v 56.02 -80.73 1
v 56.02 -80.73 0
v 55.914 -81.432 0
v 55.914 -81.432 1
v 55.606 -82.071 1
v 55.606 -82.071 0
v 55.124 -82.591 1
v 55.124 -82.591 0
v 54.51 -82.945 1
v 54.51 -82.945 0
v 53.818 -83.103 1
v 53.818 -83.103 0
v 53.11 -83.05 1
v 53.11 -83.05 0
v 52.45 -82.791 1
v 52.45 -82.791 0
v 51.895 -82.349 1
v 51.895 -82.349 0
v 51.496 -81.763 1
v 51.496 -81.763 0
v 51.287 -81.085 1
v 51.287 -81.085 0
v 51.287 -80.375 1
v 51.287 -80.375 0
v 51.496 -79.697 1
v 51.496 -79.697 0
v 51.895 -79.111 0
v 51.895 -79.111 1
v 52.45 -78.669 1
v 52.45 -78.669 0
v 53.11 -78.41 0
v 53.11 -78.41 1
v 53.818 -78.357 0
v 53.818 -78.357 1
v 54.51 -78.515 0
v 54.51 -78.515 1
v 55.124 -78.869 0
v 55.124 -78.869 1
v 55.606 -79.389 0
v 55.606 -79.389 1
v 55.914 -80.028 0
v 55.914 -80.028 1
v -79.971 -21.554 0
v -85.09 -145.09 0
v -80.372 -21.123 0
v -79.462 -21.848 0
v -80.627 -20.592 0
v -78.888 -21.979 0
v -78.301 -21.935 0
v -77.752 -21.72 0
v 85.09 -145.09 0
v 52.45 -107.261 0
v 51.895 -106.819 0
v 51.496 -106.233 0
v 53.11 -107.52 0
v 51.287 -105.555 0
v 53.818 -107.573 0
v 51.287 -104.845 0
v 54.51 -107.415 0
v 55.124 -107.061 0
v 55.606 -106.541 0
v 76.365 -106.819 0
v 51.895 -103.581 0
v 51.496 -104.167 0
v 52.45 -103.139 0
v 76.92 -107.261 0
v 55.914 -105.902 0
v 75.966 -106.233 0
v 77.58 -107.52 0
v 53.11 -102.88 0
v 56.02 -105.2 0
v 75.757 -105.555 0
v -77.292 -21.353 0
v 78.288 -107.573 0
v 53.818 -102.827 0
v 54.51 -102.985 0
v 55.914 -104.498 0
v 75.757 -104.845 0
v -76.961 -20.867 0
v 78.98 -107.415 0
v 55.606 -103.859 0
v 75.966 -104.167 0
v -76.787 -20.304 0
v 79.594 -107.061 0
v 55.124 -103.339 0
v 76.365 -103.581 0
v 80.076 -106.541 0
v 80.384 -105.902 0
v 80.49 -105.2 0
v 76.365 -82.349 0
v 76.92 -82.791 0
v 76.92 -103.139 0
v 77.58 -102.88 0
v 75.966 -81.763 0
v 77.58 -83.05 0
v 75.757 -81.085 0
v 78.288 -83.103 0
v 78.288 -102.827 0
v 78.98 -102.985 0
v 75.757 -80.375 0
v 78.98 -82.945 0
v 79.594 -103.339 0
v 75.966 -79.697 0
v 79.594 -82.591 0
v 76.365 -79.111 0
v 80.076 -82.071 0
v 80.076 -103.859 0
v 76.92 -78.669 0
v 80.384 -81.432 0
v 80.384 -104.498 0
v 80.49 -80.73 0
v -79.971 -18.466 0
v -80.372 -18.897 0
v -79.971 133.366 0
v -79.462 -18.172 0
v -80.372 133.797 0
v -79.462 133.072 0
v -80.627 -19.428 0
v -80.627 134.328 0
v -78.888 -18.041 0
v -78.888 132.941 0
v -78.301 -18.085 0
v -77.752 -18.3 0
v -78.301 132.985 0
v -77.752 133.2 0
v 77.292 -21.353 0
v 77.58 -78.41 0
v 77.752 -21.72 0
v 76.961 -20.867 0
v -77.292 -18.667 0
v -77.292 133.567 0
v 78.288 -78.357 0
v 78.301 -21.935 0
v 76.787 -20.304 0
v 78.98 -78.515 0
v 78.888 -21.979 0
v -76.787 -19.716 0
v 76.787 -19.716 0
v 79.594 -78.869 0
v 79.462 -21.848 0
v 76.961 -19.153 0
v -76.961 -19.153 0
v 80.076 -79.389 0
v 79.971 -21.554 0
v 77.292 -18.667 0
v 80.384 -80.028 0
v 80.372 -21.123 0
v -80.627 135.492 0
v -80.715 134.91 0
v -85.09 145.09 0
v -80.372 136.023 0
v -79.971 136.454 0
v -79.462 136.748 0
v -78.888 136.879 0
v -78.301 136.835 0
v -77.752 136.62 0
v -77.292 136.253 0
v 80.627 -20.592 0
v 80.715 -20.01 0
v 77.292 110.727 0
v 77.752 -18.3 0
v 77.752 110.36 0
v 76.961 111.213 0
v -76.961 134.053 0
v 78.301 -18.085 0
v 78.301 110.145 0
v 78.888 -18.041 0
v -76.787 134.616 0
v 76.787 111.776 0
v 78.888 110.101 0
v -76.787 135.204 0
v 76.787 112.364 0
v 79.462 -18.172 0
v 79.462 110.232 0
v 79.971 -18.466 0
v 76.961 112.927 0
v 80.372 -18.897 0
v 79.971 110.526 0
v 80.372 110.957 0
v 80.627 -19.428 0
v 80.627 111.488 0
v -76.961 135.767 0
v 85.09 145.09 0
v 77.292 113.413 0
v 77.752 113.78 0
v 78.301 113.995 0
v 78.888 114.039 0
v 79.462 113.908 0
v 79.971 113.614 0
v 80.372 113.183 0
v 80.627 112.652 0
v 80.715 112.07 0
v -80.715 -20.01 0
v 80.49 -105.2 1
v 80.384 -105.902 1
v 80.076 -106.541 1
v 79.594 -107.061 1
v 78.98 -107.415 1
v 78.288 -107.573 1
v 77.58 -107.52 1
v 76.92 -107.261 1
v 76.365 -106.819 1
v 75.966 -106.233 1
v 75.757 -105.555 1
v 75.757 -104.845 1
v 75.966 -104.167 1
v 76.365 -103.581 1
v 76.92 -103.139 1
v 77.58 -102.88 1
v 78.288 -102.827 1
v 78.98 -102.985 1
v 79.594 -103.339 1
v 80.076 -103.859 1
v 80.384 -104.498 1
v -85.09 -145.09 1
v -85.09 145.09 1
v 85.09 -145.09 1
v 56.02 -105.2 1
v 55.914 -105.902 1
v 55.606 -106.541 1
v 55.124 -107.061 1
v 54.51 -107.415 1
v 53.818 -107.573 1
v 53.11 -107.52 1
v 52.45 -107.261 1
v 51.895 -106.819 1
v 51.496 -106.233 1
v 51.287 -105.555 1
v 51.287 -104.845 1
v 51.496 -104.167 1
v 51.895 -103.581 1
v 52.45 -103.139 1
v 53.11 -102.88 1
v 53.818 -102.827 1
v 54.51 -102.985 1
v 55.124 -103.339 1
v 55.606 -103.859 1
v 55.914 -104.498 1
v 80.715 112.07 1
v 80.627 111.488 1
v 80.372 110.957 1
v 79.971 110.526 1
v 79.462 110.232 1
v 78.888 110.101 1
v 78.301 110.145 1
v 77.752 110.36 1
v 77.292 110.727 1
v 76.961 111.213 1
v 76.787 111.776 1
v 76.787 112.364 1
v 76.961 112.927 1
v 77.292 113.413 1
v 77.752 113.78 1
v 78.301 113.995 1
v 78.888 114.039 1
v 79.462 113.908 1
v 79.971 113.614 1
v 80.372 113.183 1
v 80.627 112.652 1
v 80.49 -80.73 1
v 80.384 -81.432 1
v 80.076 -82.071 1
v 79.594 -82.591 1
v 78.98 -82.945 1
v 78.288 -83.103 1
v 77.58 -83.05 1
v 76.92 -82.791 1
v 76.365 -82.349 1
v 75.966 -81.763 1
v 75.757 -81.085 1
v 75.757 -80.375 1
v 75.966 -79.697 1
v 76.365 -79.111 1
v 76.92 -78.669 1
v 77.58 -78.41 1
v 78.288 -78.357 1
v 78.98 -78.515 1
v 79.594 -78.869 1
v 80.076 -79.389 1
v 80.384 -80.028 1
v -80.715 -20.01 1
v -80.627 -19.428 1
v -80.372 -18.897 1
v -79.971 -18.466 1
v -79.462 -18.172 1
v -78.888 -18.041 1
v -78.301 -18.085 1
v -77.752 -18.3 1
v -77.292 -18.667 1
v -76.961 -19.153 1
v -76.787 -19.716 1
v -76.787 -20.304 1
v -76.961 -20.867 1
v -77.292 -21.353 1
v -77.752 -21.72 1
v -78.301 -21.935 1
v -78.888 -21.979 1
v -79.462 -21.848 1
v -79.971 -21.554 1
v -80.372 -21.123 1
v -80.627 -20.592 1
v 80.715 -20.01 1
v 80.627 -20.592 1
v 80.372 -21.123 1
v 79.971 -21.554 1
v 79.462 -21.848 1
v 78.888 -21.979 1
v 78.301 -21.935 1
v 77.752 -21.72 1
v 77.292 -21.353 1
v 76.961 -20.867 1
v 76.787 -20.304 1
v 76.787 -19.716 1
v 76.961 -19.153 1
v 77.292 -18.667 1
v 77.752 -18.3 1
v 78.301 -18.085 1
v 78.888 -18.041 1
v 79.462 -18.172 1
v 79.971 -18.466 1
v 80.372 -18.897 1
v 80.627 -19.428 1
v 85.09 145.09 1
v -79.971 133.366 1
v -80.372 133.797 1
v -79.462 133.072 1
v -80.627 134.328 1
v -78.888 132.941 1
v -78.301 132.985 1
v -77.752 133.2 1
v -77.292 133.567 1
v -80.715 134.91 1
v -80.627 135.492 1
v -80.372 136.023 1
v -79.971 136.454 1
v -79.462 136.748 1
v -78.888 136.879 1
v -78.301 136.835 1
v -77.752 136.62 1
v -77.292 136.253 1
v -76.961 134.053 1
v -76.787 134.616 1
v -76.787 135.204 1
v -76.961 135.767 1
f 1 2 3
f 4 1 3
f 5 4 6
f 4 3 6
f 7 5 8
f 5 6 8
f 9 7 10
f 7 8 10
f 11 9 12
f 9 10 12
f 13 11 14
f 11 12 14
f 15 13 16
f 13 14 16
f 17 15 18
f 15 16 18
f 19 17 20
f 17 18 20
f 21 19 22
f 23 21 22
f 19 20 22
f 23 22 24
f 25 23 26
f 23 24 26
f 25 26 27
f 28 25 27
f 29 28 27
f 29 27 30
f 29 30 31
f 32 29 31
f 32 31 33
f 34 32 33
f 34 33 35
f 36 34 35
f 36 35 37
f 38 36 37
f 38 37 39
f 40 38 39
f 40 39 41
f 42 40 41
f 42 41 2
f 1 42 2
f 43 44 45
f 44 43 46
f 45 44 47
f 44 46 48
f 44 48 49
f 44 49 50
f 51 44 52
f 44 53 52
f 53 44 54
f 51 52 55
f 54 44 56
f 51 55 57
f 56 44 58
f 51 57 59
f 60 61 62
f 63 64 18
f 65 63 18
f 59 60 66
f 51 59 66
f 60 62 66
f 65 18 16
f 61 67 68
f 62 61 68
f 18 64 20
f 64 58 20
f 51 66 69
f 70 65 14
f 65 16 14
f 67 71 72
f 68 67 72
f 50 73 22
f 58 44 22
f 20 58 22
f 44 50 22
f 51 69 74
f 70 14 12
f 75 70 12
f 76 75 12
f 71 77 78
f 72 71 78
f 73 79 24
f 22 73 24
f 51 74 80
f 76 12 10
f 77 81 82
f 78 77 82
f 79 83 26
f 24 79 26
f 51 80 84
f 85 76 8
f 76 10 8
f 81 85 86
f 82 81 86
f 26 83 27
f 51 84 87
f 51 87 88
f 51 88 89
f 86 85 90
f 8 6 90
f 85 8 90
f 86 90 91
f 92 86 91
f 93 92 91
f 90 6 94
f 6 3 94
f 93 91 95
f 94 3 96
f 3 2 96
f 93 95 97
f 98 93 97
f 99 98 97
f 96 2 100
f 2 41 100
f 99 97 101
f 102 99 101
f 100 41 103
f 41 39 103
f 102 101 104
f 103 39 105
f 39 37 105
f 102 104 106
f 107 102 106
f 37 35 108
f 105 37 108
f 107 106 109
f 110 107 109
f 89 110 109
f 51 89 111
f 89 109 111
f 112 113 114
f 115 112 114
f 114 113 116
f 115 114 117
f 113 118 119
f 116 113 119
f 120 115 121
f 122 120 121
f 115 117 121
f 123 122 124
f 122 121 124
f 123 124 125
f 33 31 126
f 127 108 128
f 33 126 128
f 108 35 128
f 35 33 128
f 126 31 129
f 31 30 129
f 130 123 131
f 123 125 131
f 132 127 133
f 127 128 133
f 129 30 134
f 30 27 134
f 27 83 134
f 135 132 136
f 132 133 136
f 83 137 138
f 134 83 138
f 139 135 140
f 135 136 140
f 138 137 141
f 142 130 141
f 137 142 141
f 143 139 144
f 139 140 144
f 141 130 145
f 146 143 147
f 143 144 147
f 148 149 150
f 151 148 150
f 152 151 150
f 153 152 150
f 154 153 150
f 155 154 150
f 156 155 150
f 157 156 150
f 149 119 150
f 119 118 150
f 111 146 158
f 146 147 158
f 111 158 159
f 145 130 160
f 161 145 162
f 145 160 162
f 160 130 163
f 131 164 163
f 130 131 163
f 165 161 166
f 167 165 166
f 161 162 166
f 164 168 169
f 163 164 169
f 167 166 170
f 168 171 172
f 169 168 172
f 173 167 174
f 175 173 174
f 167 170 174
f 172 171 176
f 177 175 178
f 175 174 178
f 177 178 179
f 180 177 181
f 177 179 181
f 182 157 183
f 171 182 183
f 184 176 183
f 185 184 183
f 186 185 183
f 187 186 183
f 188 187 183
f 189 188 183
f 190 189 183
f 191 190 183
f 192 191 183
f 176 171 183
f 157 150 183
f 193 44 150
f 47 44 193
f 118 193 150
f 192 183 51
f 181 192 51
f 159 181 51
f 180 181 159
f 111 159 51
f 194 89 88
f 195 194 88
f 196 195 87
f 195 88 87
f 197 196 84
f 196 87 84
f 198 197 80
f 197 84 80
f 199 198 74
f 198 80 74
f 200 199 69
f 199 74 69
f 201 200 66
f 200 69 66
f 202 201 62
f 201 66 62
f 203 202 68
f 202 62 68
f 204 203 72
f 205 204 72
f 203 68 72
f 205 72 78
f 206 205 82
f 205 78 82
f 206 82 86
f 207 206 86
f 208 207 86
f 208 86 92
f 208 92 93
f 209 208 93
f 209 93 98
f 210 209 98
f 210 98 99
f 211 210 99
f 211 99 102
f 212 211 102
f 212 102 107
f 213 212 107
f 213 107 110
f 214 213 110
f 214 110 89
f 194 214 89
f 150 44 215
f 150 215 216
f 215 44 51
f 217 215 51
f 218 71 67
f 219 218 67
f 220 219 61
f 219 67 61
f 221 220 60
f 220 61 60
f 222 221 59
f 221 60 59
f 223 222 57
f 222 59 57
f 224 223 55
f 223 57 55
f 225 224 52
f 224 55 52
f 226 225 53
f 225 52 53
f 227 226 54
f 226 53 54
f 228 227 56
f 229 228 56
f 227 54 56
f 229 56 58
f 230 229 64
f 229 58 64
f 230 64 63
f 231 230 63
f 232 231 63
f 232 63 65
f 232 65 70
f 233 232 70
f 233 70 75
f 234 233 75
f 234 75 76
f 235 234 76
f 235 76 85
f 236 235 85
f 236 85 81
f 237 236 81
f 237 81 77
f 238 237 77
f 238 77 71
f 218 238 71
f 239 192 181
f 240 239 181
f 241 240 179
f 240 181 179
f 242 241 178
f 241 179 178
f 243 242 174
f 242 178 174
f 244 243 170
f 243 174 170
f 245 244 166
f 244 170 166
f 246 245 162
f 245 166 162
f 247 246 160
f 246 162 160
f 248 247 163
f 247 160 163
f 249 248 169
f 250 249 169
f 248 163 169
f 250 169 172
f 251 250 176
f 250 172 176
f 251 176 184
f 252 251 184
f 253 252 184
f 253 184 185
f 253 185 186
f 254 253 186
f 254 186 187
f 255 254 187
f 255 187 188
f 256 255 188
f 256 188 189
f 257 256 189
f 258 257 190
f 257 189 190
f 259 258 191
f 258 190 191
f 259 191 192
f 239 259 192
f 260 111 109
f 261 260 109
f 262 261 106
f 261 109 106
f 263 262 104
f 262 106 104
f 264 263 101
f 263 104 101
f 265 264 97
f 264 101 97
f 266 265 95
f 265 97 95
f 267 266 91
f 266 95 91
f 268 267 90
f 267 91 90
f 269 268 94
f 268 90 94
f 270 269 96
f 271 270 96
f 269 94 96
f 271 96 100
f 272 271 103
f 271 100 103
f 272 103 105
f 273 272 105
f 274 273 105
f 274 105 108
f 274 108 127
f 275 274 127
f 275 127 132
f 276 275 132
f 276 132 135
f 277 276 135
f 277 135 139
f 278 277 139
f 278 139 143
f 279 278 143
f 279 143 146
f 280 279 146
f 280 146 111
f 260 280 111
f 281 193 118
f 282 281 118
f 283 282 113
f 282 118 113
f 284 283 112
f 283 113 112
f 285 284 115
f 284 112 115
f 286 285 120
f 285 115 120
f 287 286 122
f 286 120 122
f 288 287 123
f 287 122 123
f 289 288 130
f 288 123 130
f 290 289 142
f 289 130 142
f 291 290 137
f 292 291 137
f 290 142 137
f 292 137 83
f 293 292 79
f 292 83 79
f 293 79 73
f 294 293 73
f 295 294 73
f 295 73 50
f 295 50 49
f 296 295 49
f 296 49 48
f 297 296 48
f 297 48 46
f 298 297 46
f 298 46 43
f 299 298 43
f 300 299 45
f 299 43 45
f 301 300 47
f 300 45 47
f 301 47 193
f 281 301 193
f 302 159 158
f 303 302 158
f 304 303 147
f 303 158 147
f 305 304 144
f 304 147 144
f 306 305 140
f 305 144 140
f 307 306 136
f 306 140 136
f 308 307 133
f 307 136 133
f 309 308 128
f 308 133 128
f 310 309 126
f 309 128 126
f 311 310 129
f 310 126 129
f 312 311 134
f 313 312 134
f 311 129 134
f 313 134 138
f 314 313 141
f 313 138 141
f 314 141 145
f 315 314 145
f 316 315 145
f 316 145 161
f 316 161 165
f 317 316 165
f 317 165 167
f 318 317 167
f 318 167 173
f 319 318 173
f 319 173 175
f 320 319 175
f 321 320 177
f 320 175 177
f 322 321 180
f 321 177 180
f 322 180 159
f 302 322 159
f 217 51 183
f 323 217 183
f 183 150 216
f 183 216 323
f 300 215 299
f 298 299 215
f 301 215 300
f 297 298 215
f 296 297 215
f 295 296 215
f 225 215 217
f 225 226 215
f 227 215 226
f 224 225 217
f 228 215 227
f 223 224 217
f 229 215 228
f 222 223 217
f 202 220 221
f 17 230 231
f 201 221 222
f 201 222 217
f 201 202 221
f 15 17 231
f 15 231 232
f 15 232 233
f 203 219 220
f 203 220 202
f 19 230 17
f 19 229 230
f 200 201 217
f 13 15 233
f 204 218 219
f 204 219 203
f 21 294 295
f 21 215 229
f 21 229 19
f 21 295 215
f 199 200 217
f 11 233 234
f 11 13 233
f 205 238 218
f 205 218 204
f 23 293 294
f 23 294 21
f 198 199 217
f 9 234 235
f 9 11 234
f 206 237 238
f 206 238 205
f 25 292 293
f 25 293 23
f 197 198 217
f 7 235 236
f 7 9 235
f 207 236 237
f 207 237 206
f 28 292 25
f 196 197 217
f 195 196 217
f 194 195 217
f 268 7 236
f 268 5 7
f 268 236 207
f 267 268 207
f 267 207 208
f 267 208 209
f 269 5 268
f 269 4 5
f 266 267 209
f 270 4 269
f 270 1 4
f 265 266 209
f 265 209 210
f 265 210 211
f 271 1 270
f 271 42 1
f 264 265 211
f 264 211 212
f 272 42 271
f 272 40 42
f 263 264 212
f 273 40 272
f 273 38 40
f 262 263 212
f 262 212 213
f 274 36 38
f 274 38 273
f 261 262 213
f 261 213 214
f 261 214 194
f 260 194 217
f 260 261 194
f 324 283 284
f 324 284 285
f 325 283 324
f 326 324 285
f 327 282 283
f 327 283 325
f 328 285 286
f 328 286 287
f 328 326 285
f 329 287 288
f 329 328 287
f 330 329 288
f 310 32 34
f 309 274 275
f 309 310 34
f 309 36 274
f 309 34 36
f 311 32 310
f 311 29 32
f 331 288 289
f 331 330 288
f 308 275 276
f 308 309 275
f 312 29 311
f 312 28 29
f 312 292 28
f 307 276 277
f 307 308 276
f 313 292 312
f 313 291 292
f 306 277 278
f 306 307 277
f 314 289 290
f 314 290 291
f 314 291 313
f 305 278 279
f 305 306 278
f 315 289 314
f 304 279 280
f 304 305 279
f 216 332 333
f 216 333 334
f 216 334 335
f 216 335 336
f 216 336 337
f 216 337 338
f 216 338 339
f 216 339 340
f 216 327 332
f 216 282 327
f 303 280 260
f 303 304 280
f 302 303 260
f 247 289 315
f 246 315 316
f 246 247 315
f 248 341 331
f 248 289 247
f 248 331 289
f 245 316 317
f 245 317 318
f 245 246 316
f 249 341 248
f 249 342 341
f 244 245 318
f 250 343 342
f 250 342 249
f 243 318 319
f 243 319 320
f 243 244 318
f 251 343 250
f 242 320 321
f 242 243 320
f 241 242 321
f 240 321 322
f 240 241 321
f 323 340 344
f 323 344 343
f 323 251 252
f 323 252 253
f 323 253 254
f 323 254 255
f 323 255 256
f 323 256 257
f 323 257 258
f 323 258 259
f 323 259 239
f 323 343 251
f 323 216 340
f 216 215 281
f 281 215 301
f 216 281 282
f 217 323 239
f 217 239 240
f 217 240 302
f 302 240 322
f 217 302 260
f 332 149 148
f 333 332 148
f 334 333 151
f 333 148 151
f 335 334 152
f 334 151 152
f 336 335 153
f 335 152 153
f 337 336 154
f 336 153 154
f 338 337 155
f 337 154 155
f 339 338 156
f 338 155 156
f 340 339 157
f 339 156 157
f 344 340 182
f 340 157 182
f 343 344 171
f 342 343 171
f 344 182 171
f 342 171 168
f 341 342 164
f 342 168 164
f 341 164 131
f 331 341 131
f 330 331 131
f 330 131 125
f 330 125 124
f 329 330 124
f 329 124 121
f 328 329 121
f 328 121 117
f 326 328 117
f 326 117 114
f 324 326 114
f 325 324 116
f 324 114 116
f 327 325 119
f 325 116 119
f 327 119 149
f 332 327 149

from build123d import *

# Parameters (mm, degrees)
CROQUIS1_W              = 170.18
CROQUIS1_H              = 290.18
SALIENTE_EXTRUIR1_DEPTH = 1
CROQUIS2_R              = 1.975
CORTAR_EXTRUIR1_DEPTH   = 1
CROQUIS3_R              = 2.38
CORTAR_EXTRUIR2_DEPTH   = 10


with BuildPart() as part:
    # Croquis1 → Saliente-Extruir1 (new body)
    with BuildSketch(Plane.XY):
        Rectangle(CROQUIS1_W, CROQUIS1_H)
    extrude(amount=SALIENTE_EXTRUIR1_DEPTH)

    # Croquis2 → Cortar-Extruir1 (cut)
    with BuildSketch(Plane(origin=(0, 0, 0), x_dir=(-1, 0, 0), z_dir=(0, 0, -1))):
        with Locations(Location((-78.74, 112.07, 0), (0, 0, 180))):
            Circle(CROQUIS2_R)
        with Locations((78.74, 134.91)):
            Circle(CROQUIS2_R)
        with Locations((78.74, -20.01)):
            Circle(CROQUIS2_R)
        with Locations(Location((-78.74, -20.01, 0), (0, 0, 180))):
            Circle(CROQUIS2_R)
    extrude(amount=-CORTAR_EXTRUIR1_DEPTH, mode=Mode.SUBTRACT)

    # Croquis3 → Cortar-Extruir2 (cut)
    with BuildSketch(Plane(origin=(0, 0, 0), x_dir=(-1, 0, 0), z_dir=(0, 0, -1))):
        with Locations(Location((-78.11, -105.2, 0), (0, 0, 180))):
            Circle(CROQUIS3_R)
        with Locations(Location((-53.64, -105.2, 0), (0, 0, 180))):
            Circle(CROQUIS3_R)
        with Locations(Location((-53.64, -80.73, 0), (0, 0, 180))):
            Circle(CROQUIS3_R)
        with Locations(Location((-78.11, -80.73, 0), (0, 0, 180))):
            Circle(CROQUIS3_R)
    extrude(amount=-CORTAR_EXTRUIR2_DEPTH, mode=Mode.SUBTRACT)


solid = part.part
